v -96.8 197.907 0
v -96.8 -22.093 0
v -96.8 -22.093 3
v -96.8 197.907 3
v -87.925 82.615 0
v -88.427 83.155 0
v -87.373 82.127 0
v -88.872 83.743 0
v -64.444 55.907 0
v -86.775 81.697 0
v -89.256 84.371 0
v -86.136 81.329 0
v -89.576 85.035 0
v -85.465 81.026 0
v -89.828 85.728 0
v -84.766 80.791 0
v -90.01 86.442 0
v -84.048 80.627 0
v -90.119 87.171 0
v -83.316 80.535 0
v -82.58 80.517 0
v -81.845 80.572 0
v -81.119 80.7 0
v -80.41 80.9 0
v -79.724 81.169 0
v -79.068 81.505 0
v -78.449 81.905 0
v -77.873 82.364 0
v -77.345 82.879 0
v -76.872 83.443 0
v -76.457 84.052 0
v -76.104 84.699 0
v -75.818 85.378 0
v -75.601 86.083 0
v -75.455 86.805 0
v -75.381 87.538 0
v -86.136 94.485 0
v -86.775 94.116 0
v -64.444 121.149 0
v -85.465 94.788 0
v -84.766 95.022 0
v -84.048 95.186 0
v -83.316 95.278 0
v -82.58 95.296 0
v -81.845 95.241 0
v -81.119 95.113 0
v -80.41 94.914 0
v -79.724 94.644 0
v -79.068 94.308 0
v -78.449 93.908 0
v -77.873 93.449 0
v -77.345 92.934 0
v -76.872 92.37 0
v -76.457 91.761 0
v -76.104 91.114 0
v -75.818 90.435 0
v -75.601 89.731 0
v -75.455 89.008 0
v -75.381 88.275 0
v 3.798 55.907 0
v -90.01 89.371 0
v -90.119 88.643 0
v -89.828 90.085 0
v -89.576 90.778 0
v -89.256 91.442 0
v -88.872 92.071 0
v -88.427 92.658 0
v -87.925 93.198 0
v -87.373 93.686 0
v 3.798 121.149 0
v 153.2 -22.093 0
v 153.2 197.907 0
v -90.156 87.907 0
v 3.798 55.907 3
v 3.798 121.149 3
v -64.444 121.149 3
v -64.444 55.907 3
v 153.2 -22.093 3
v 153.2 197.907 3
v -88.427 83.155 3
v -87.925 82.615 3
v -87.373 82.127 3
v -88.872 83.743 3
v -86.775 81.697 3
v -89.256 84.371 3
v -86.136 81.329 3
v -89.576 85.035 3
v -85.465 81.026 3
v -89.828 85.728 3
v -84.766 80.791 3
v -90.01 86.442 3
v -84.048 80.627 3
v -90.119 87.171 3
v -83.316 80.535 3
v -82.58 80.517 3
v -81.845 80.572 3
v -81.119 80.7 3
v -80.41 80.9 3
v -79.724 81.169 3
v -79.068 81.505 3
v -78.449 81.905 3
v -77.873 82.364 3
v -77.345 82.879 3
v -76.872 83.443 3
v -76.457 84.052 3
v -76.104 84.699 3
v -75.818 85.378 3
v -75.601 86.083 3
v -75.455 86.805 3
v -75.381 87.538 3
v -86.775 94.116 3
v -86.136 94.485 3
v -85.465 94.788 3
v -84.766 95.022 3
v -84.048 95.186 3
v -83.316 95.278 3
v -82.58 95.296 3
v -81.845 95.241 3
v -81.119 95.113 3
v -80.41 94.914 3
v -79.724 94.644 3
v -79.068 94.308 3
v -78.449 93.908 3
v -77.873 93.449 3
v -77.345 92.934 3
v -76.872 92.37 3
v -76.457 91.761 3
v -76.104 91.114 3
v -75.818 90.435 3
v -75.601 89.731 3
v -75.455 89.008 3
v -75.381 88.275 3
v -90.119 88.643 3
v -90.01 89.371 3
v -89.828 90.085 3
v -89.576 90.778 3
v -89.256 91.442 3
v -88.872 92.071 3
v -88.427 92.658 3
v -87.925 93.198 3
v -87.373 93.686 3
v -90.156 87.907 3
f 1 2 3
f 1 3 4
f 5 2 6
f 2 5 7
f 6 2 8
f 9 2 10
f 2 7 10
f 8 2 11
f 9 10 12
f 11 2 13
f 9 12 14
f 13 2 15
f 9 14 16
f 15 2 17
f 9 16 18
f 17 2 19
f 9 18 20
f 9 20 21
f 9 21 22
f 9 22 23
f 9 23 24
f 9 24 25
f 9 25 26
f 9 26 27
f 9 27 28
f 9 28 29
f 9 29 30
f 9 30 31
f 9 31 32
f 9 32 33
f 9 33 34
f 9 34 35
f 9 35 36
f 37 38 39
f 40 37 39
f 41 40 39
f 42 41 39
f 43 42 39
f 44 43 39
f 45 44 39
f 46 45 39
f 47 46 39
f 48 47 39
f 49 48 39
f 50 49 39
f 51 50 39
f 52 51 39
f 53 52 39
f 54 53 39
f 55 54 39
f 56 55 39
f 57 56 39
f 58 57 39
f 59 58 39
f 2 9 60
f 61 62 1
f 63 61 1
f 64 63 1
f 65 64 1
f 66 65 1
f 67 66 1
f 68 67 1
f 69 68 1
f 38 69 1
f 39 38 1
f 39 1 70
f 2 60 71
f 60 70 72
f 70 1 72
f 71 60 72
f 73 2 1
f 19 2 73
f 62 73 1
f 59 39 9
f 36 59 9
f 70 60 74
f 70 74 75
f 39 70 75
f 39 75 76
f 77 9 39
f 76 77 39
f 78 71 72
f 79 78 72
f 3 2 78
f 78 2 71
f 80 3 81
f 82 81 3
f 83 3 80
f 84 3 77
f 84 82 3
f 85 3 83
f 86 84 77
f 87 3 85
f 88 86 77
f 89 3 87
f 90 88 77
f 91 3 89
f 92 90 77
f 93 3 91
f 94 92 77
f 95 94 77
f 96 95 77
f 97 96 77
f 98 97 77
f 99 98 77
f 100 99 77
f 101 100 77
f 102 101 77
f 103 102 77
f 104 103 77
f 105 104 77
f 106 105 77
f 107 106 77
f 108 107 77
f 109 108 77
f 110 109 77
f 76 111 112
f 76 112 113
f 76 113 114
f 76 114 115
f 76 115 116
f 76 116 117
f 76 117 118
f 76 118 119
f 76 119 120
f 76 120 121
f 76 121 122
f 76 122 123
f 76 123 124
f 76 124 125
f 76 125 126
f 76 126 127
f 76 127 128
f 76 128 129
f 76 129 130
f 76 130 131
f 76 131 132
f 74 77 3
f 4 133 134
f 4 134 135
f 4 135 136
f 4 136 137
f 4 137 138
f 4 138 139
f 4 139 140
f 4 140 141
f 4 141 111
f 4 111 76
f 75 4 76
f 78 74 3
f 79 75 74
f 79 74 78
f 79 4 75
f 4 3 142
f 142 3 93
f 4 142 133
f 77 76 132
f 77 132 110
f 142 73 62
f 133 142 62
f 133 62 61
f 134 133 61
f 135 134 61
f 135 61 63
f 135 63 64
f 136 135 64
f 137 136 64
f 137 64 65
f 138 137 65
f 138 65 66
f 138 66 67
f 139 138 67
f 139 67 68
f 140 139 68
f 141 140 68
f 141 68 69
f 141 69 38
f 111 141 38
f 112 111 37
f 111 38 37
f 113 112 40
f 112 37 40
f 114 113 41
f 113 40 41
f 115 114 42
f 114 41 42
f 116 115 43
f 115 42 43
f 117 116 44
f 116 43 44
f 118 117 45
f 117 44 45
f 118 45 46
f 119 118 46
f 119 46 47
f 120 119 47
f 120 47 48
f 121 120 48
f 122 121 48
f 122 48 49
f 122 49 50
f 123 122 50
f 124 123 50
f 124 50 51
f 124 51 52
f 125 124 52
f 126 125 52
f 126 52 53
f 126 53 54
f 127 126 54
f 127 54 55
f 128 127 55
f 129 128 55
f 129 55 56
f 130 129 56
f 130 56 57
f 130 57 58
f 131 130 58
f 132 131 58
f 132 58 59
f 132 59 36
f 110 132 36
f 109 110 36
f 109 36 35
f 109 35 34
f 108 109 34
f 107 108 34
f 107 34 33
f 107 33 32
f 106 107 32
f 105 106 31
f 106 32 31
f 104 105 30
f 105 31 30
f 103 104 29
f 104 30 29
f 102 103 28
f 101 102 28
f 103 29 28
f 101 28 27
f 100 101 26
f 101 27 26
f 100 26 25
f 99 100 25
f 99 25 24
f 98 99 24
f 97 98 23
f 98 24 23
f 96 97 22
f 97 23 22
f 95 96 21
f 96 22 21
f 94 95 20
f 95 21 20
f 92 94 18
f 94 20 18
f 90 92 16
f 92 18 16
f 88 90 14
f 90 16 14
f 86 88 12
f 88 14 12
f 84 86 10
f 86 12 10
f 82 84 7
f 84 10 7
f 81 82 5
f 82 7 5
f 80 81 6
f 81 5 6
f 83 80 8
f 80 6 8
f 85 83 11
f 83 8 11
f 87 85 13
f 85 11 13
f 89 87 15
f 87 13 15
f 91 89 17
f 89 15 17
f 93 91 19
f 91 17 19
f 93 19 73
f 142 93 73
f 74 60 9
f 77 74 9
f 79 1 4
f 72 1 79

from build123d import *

# Parameters (mm, degrees)
SKETCH1_W           = 250
SKETCH1_H           = 220
BOSS_EXTRUDE1_DEPTH = 3
SKETCH2_W           = 68.242640687
SKETCH2_H           = 65.242640687
CUT_EXTRUDE1_DEPTH  = 3
SKETCH3_R           = 7.392015443
CUT_EXTRUDE2_DEPTH  = 10


with BuildPart() as part:
    # Sketch1 → Boss-Extrude1 (new body)
    with BuildSketch(Plane.XY):
        with Locations((28.200067517, 87.906622336)):
            Rectangle(SKETCH1_W, SKETCH1_H)
    extrude(amount=BOSS_EXTRUDE1_DEPTH)

    # Sketch2 → Cut-Extrude1 (cut)
    with BuildSketch(Plane(origin=(0, 0, 0), x_dir=(-1, 0, 0), z_dir=(0, 0, -1))):
        with Locations((30.322878983, 88.52794268)):
            Rectangle(SKETCH2_W, SKETCH2_H)
    extrude(amount=-CUT_EXTRUDE1_DEPTH, mode=Mode.SUBTRACT)

    # Sketch3 → Cut-Extrude2 (cut)
    with BuildSketch(Plane(origin=(0, 0, 0), x_dir=(-1, 0, 0), z_dir=(0, 0, -1))):
        with Locations((82.764080487, 87.906622336)):
            Circle(SKETCH3_R)
    extrude(amount=-CUT_EXTRUDE2_DEPTH, mode=Mode.SUBTRACT)


solid = part.part
